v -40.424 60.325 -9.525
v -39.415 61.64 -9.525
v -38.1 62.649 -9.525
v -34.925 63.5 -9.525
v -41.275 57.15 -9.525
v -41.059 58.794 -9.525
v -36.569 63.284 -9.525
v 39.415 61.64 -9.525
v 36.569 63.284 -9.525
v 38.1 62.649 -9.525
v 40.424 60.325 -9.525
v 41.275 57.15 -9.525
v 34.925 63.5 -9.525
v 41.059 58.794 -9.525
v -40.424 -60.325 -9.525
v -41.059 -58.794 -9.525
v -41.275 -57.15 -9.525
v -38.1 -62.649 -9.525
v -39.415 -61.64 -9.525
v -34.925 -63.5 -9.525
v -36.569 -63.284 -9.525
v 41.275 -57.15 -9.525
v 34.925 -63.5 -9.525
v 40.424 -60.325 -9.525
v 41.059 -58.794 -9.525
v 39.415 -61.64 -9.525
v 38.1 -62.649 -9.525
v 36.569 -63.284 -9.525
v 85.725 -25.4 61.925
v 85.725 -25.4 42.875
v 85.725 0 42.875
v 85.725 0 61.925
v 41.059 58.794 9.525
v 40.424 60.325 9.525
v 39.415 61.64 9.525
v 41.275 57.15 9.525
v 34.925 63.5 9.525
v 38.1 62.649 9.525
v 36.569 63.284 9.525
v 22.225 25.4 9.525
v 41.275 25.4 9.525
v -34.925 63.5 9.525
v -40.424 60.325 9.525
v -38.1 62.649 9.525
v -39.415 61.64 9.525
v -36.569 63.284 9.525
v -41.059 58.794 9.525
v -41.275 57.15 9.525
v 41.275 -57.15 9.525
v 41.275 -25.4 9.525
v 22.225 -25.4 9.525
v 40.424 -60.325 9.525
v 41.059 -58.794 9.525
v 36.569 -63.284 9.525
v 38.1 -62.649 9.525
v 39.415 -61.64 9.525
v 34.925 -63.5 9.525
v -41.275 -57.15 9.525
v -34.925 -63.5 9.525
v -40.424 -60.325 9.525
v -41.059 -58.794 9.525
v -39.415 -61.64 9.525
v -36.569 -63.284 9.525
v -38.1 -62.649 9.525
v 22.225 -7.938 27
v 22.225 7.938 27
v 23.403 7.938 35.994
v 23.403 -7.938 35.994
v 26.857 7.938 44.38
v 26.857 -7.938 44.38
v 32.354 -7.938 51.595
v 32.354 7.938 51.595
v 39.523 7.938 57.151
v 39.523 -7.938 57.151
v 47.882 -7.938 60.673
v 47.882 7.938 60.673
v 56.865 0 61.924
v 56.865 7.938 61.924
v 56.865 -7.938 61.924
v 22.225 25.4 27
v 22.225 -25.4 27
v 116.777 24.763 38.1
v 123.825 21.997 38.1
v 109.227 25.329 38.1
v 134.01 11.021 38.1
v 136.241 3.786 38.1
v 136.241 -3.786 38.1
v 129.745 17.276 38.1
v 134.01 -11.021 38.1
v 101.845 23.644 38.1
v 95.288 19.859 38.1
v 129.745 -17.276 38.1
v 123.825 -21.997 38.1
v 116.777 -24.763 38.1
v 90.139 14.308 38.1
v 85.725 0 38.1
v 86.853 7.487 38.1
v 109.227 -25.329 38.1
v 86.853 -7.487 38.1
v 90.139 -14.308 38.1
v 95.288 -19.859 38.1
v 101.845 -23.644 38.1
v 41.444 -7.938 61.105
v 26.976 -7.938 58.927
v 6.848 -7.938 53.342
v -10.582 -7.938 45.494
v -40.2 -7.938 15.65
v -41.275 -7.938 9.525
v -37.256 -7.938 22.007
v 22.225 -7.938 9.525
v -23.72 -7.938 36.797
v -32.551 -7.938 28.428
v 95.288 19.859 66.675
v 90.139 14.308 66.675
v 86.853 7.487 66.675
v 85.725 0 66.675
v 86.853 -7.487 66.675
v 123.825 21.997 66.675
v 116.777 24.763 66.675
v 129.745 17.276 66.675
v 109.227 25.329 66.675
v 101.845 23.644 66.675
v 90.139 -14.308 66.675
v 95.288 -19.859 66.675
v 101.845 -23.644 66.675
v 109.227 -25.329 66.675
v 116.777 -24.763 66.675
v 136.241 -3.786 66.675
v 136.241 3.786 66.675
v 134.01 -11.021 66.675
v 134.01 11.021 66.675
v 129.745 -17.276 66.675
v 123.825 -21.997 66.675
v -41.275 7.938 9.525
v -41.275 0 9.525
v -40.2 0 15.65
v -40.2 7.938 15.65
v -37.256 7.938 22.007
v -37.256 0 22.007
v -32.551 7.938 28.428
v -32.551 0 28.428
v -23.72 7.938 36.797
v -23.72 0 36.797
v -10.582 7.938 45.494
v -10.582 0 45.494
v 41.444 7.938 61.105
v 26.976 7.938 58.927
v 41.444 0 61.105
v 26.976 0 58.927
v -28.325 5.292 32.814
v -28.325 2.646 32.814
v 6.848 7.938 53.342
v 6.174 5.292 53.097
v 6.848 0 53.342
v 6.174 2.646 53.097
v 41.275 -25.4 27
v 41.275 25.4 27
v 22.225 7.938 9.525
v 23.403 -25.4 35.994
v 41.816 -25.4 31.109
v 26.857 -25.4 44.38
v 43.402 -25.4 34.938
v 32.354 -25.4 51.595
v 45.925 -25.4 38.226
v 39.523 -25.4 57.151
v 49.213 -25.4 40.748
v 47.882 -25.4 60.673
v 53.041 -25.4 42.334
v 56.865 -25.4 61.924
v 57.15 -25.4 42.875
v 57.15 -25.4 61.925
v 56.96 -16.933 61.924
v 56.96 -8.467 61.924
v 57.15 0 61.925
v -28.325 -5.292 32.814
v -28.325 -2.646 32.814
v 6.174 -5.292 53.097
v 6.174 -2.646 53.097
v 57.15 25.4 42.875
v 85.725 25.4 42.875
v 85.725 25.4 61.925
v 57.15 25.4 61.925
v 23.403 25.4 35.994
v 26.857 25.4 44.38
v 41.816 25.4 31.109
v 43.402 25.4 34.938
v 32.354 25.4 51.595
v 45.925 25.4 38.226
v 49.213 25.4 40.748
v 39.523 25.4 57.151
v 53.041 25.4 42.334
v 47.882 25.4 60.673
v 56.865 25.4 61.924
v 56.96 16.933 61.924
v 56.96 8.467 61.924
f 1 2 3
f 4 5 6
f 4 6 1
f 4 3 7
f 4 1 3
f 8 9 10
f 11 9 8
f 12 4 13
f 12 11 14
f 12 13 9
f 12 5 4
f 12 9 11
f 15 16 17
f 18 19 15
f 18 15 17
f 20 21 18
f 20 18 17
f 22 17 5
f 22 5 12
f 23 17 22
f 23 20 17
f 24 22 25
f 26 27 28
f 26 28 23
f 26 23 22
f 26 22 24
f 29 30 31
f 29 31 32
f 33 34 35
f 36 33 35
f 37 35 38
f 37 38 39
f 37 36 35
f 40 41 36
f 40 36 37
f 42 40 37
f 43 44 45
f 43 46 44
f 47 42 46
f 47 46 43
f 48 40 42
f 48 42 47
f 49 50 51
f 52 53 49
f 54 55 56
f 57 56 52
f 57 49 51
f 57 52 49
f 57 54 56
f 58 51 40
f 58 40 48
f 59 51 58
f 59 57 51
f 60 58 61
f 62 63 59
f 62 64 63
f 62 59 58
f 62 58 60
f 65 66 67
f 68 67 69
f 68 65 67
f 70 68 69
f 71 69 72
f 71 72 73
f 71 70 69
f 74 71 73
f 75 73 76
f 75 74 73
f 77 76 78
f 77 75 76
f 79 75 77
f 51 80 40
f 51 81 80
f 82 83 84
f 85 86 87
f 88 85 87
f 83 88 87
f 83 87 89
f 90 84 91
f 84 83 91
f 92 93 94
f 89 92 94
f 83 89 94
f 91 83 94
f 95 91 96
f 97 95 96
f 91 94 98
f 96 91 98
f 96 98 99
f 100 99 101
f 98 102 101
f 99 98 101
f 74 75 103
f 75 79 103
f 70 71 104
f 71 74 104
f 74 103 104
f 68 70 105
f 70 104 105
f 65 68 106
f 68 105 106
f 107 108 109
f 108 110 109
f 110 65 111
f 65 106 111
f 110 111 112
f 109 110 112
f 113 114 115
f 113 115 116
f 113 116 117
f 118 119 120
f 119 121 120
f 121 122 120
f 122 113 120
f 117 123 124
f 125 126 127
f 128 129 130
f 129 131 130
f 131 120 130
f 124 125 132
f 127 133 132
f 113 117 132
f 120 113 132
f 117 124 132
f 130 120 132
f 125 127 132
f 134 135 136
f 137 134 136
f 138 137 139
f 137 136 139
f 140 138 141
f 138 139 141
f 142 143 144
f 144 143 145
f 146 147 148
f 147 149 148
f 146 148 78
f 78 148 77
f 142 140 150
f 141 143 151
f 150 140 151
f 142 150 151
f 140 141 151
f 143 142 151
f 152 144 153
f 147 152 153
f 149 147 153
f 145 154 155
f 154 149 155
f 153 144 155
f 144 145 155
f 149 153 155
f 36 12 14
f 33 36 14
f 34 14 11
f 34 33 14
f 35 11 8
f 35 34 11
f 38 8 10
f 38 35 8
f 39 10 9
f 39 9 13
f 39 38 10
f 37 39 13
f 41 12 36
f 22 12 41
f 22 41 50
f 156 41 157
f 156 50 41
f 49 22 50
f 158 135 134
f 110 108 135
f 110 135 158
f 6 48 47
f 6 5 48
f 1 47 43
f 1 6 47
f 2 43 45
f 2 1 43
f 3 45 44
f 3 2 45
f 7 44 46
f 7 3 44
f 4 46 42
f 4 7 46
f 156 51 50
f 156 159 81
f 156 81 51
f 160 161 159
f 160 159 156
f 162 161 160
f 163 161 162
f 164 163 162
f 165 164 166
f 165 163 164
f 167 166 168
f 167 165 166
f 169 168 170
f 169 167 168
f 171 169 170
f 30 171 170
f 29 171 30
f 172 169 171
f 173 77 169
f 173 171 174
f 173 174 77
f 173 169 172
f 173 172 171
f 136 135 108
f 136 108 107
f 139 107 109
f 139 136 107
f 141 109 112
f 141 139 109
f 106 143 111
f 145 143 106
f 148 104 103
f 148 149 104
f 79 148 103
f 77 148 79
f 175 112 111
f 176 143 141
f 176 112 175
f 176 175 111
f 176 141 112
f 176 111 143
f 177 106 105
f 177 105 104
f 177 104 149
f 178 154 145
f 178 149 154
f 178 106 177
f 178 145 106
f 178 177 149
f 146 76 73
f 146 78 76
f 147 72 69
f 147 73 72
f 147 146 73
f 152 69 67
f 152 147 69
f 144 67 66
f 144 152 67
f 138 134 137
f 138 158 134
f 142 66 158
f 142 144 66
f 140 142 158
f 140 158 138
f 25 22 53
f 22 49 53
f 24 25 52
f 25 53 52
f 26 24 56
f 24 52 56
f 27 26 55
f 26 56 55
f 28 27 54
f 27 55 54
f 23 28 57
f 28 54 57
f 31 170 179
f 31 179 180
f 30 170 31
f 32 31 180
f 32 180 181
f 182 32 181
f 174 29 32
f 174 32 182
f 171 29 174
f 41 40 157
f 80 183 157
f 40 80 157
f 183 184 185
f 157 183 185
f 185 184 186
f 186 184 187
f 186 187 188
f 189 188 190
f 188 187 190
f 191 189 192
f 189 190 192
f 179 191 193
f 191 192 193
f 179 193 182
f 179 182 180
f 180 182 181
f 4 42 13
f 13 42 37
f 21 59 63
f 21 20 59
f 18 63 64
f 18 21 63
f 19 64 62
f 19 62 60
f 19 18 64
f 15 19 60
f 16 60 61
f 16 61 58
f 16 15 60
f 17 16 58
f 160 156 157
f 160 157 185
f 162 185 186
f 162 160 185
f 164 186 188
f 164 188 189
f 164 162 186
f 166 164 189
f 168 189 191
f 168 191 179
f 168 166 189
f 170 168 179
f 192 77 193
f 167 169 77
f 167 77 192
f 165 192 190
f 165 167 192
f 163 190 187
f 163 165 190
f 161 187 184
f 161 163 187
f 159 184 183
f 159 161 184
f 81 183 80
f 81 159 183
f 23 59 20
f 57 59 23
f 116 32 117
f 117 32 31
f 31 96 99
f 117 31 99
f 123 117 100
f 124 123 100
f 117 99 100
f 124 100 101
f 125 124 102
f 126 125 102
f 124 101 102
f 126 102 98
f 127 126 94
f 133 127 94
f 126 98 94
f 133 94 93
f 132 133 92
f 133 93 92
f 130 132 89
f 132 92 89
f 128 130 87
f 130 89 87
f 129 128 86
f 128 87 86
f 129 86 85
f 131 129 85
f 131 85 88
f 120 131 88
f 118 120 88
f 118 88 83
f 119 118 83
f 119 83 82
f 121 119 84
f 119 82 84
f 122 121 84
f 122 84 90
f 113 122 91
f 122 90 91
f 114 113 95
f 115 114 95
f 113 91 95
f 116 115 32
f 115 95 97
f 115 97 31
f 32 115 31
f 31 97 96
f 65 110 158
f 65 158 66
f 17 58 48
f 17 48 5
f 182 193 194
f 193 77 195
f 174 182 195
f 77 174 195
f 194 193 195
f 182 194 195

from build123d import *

# Parameters (mm, degrees)
F1_DEPTH = 63.5
F0_W     = 25.4
F0_H     = 19.05
F2_DEPTH = 25.4
F3_DEPTH = 7.9375
F5_R     = 6.35


with BuildPart() as f1:
    # F0 (on Front) → F1 (new body, symmetric)
    with BuildSketch(Plane.XZ):
        Polygon((-41.275, 9.525), (-41.275, -9.525), (41.275, -9.525), (41.275, 9.525), (22.225, 9.525), align=None)
    extrude(amount=F1_DEPTH, both=True)

    # F0 (on Front) → F2 (join, symmetric)
    with BuildSketch(Plane.XZ):
        with BuildLine():
            Line((22.225, 9.525), (41.275, 9.525))
            Line((41.275, 9.525), (41.275, 27.0002))
            ThreePointArc((41.275, 27.0002), (45.9246798487, 38.2255201513), (57.15, 42.8752))
            Line((57.15, 42.8752), (60.325, 42.8752))
            Line((60.325, 42.8752), (60.325, 61.9252))
            Line((60.325, 61.9252), (57.15, 61.9252))
            add(Edge.make_bspline(
                [(56.8650860234, 61.9240378336), (56.9600123168, 61.9245080927), (57.0549836795, 61.9248955401), (57.15, 61.9252)],
                knots=[111.3191511986, 111.3191511986, 111.3191511986, 111.3191511986, 111.5045361635, 111.5045361635, 111.5045361635, 111.5045361635], degree=3))
            ThreePointArc((56.8650860234, 61.9240378336), (32.3537679714, 51.5949657477), (22.225, 27.0002))
            Line((22.225, 27.0002), (22.225, 9.525))
        make_face()
        with Locations((73.025, 52.4002)):
            Rectangle(F0_W, F0_H)
    extrude(amount=F2_DEPTH, both=True)

    # F0 (on Front) → F4 (revolve)
    with BuildSketch(Plane.XZ):
        Polygon((85.725, 66.675), (85.725, 61.9252), (85.725, 42.8752), (85.725, 38.1), (111.125, 38.1), (111.125, 66.675), align=None)
    revolve(axis=Axis((111.125, 0, 52.3875), (0, 0, 1)))

    # F5
    f5_edges = [f1.edges().sort_by_distance(p)[0] for p in [
        (41.275, -63.5, 0),
        (-41.275, -63.5, 0),
        (41.275, 63.5, 0),
        (-41.275, 63.5, 0),
    ]]
    fillet(f5_edges, radius=F5_R)


with BuildPart() as f3:
    # F0 (on Front) → F3 (new body, symmetric)
    with BuildSketch(Plane.XZ):
        with BuildLine():
            add(Edge.make_bspline(
                [(-41.275, 9.525), (-40.886114711, 31.4997451474), (-0.1358386013, 61.6416586733), (56.8650860234, 61.9240378336)],
                knots=[0, 0, 0, 0, 111.3191511986, 111.3191511986, 111.3191511986, 111.3191511986], degree=3))
            Line((-41.275, 9.525), (22.225, 9.525))
            Line((22.225, 9.525), (22.225, 27.0002))
            ThreePointArc((22.225, 27.0002), (32.3537679714, 51.5949657477), (56.8650860234, 61.9240378336))
        make_face()
    extrude(amount=F3_DEPTH, both=True)


solid = Compound([f1.part, f3.part])
